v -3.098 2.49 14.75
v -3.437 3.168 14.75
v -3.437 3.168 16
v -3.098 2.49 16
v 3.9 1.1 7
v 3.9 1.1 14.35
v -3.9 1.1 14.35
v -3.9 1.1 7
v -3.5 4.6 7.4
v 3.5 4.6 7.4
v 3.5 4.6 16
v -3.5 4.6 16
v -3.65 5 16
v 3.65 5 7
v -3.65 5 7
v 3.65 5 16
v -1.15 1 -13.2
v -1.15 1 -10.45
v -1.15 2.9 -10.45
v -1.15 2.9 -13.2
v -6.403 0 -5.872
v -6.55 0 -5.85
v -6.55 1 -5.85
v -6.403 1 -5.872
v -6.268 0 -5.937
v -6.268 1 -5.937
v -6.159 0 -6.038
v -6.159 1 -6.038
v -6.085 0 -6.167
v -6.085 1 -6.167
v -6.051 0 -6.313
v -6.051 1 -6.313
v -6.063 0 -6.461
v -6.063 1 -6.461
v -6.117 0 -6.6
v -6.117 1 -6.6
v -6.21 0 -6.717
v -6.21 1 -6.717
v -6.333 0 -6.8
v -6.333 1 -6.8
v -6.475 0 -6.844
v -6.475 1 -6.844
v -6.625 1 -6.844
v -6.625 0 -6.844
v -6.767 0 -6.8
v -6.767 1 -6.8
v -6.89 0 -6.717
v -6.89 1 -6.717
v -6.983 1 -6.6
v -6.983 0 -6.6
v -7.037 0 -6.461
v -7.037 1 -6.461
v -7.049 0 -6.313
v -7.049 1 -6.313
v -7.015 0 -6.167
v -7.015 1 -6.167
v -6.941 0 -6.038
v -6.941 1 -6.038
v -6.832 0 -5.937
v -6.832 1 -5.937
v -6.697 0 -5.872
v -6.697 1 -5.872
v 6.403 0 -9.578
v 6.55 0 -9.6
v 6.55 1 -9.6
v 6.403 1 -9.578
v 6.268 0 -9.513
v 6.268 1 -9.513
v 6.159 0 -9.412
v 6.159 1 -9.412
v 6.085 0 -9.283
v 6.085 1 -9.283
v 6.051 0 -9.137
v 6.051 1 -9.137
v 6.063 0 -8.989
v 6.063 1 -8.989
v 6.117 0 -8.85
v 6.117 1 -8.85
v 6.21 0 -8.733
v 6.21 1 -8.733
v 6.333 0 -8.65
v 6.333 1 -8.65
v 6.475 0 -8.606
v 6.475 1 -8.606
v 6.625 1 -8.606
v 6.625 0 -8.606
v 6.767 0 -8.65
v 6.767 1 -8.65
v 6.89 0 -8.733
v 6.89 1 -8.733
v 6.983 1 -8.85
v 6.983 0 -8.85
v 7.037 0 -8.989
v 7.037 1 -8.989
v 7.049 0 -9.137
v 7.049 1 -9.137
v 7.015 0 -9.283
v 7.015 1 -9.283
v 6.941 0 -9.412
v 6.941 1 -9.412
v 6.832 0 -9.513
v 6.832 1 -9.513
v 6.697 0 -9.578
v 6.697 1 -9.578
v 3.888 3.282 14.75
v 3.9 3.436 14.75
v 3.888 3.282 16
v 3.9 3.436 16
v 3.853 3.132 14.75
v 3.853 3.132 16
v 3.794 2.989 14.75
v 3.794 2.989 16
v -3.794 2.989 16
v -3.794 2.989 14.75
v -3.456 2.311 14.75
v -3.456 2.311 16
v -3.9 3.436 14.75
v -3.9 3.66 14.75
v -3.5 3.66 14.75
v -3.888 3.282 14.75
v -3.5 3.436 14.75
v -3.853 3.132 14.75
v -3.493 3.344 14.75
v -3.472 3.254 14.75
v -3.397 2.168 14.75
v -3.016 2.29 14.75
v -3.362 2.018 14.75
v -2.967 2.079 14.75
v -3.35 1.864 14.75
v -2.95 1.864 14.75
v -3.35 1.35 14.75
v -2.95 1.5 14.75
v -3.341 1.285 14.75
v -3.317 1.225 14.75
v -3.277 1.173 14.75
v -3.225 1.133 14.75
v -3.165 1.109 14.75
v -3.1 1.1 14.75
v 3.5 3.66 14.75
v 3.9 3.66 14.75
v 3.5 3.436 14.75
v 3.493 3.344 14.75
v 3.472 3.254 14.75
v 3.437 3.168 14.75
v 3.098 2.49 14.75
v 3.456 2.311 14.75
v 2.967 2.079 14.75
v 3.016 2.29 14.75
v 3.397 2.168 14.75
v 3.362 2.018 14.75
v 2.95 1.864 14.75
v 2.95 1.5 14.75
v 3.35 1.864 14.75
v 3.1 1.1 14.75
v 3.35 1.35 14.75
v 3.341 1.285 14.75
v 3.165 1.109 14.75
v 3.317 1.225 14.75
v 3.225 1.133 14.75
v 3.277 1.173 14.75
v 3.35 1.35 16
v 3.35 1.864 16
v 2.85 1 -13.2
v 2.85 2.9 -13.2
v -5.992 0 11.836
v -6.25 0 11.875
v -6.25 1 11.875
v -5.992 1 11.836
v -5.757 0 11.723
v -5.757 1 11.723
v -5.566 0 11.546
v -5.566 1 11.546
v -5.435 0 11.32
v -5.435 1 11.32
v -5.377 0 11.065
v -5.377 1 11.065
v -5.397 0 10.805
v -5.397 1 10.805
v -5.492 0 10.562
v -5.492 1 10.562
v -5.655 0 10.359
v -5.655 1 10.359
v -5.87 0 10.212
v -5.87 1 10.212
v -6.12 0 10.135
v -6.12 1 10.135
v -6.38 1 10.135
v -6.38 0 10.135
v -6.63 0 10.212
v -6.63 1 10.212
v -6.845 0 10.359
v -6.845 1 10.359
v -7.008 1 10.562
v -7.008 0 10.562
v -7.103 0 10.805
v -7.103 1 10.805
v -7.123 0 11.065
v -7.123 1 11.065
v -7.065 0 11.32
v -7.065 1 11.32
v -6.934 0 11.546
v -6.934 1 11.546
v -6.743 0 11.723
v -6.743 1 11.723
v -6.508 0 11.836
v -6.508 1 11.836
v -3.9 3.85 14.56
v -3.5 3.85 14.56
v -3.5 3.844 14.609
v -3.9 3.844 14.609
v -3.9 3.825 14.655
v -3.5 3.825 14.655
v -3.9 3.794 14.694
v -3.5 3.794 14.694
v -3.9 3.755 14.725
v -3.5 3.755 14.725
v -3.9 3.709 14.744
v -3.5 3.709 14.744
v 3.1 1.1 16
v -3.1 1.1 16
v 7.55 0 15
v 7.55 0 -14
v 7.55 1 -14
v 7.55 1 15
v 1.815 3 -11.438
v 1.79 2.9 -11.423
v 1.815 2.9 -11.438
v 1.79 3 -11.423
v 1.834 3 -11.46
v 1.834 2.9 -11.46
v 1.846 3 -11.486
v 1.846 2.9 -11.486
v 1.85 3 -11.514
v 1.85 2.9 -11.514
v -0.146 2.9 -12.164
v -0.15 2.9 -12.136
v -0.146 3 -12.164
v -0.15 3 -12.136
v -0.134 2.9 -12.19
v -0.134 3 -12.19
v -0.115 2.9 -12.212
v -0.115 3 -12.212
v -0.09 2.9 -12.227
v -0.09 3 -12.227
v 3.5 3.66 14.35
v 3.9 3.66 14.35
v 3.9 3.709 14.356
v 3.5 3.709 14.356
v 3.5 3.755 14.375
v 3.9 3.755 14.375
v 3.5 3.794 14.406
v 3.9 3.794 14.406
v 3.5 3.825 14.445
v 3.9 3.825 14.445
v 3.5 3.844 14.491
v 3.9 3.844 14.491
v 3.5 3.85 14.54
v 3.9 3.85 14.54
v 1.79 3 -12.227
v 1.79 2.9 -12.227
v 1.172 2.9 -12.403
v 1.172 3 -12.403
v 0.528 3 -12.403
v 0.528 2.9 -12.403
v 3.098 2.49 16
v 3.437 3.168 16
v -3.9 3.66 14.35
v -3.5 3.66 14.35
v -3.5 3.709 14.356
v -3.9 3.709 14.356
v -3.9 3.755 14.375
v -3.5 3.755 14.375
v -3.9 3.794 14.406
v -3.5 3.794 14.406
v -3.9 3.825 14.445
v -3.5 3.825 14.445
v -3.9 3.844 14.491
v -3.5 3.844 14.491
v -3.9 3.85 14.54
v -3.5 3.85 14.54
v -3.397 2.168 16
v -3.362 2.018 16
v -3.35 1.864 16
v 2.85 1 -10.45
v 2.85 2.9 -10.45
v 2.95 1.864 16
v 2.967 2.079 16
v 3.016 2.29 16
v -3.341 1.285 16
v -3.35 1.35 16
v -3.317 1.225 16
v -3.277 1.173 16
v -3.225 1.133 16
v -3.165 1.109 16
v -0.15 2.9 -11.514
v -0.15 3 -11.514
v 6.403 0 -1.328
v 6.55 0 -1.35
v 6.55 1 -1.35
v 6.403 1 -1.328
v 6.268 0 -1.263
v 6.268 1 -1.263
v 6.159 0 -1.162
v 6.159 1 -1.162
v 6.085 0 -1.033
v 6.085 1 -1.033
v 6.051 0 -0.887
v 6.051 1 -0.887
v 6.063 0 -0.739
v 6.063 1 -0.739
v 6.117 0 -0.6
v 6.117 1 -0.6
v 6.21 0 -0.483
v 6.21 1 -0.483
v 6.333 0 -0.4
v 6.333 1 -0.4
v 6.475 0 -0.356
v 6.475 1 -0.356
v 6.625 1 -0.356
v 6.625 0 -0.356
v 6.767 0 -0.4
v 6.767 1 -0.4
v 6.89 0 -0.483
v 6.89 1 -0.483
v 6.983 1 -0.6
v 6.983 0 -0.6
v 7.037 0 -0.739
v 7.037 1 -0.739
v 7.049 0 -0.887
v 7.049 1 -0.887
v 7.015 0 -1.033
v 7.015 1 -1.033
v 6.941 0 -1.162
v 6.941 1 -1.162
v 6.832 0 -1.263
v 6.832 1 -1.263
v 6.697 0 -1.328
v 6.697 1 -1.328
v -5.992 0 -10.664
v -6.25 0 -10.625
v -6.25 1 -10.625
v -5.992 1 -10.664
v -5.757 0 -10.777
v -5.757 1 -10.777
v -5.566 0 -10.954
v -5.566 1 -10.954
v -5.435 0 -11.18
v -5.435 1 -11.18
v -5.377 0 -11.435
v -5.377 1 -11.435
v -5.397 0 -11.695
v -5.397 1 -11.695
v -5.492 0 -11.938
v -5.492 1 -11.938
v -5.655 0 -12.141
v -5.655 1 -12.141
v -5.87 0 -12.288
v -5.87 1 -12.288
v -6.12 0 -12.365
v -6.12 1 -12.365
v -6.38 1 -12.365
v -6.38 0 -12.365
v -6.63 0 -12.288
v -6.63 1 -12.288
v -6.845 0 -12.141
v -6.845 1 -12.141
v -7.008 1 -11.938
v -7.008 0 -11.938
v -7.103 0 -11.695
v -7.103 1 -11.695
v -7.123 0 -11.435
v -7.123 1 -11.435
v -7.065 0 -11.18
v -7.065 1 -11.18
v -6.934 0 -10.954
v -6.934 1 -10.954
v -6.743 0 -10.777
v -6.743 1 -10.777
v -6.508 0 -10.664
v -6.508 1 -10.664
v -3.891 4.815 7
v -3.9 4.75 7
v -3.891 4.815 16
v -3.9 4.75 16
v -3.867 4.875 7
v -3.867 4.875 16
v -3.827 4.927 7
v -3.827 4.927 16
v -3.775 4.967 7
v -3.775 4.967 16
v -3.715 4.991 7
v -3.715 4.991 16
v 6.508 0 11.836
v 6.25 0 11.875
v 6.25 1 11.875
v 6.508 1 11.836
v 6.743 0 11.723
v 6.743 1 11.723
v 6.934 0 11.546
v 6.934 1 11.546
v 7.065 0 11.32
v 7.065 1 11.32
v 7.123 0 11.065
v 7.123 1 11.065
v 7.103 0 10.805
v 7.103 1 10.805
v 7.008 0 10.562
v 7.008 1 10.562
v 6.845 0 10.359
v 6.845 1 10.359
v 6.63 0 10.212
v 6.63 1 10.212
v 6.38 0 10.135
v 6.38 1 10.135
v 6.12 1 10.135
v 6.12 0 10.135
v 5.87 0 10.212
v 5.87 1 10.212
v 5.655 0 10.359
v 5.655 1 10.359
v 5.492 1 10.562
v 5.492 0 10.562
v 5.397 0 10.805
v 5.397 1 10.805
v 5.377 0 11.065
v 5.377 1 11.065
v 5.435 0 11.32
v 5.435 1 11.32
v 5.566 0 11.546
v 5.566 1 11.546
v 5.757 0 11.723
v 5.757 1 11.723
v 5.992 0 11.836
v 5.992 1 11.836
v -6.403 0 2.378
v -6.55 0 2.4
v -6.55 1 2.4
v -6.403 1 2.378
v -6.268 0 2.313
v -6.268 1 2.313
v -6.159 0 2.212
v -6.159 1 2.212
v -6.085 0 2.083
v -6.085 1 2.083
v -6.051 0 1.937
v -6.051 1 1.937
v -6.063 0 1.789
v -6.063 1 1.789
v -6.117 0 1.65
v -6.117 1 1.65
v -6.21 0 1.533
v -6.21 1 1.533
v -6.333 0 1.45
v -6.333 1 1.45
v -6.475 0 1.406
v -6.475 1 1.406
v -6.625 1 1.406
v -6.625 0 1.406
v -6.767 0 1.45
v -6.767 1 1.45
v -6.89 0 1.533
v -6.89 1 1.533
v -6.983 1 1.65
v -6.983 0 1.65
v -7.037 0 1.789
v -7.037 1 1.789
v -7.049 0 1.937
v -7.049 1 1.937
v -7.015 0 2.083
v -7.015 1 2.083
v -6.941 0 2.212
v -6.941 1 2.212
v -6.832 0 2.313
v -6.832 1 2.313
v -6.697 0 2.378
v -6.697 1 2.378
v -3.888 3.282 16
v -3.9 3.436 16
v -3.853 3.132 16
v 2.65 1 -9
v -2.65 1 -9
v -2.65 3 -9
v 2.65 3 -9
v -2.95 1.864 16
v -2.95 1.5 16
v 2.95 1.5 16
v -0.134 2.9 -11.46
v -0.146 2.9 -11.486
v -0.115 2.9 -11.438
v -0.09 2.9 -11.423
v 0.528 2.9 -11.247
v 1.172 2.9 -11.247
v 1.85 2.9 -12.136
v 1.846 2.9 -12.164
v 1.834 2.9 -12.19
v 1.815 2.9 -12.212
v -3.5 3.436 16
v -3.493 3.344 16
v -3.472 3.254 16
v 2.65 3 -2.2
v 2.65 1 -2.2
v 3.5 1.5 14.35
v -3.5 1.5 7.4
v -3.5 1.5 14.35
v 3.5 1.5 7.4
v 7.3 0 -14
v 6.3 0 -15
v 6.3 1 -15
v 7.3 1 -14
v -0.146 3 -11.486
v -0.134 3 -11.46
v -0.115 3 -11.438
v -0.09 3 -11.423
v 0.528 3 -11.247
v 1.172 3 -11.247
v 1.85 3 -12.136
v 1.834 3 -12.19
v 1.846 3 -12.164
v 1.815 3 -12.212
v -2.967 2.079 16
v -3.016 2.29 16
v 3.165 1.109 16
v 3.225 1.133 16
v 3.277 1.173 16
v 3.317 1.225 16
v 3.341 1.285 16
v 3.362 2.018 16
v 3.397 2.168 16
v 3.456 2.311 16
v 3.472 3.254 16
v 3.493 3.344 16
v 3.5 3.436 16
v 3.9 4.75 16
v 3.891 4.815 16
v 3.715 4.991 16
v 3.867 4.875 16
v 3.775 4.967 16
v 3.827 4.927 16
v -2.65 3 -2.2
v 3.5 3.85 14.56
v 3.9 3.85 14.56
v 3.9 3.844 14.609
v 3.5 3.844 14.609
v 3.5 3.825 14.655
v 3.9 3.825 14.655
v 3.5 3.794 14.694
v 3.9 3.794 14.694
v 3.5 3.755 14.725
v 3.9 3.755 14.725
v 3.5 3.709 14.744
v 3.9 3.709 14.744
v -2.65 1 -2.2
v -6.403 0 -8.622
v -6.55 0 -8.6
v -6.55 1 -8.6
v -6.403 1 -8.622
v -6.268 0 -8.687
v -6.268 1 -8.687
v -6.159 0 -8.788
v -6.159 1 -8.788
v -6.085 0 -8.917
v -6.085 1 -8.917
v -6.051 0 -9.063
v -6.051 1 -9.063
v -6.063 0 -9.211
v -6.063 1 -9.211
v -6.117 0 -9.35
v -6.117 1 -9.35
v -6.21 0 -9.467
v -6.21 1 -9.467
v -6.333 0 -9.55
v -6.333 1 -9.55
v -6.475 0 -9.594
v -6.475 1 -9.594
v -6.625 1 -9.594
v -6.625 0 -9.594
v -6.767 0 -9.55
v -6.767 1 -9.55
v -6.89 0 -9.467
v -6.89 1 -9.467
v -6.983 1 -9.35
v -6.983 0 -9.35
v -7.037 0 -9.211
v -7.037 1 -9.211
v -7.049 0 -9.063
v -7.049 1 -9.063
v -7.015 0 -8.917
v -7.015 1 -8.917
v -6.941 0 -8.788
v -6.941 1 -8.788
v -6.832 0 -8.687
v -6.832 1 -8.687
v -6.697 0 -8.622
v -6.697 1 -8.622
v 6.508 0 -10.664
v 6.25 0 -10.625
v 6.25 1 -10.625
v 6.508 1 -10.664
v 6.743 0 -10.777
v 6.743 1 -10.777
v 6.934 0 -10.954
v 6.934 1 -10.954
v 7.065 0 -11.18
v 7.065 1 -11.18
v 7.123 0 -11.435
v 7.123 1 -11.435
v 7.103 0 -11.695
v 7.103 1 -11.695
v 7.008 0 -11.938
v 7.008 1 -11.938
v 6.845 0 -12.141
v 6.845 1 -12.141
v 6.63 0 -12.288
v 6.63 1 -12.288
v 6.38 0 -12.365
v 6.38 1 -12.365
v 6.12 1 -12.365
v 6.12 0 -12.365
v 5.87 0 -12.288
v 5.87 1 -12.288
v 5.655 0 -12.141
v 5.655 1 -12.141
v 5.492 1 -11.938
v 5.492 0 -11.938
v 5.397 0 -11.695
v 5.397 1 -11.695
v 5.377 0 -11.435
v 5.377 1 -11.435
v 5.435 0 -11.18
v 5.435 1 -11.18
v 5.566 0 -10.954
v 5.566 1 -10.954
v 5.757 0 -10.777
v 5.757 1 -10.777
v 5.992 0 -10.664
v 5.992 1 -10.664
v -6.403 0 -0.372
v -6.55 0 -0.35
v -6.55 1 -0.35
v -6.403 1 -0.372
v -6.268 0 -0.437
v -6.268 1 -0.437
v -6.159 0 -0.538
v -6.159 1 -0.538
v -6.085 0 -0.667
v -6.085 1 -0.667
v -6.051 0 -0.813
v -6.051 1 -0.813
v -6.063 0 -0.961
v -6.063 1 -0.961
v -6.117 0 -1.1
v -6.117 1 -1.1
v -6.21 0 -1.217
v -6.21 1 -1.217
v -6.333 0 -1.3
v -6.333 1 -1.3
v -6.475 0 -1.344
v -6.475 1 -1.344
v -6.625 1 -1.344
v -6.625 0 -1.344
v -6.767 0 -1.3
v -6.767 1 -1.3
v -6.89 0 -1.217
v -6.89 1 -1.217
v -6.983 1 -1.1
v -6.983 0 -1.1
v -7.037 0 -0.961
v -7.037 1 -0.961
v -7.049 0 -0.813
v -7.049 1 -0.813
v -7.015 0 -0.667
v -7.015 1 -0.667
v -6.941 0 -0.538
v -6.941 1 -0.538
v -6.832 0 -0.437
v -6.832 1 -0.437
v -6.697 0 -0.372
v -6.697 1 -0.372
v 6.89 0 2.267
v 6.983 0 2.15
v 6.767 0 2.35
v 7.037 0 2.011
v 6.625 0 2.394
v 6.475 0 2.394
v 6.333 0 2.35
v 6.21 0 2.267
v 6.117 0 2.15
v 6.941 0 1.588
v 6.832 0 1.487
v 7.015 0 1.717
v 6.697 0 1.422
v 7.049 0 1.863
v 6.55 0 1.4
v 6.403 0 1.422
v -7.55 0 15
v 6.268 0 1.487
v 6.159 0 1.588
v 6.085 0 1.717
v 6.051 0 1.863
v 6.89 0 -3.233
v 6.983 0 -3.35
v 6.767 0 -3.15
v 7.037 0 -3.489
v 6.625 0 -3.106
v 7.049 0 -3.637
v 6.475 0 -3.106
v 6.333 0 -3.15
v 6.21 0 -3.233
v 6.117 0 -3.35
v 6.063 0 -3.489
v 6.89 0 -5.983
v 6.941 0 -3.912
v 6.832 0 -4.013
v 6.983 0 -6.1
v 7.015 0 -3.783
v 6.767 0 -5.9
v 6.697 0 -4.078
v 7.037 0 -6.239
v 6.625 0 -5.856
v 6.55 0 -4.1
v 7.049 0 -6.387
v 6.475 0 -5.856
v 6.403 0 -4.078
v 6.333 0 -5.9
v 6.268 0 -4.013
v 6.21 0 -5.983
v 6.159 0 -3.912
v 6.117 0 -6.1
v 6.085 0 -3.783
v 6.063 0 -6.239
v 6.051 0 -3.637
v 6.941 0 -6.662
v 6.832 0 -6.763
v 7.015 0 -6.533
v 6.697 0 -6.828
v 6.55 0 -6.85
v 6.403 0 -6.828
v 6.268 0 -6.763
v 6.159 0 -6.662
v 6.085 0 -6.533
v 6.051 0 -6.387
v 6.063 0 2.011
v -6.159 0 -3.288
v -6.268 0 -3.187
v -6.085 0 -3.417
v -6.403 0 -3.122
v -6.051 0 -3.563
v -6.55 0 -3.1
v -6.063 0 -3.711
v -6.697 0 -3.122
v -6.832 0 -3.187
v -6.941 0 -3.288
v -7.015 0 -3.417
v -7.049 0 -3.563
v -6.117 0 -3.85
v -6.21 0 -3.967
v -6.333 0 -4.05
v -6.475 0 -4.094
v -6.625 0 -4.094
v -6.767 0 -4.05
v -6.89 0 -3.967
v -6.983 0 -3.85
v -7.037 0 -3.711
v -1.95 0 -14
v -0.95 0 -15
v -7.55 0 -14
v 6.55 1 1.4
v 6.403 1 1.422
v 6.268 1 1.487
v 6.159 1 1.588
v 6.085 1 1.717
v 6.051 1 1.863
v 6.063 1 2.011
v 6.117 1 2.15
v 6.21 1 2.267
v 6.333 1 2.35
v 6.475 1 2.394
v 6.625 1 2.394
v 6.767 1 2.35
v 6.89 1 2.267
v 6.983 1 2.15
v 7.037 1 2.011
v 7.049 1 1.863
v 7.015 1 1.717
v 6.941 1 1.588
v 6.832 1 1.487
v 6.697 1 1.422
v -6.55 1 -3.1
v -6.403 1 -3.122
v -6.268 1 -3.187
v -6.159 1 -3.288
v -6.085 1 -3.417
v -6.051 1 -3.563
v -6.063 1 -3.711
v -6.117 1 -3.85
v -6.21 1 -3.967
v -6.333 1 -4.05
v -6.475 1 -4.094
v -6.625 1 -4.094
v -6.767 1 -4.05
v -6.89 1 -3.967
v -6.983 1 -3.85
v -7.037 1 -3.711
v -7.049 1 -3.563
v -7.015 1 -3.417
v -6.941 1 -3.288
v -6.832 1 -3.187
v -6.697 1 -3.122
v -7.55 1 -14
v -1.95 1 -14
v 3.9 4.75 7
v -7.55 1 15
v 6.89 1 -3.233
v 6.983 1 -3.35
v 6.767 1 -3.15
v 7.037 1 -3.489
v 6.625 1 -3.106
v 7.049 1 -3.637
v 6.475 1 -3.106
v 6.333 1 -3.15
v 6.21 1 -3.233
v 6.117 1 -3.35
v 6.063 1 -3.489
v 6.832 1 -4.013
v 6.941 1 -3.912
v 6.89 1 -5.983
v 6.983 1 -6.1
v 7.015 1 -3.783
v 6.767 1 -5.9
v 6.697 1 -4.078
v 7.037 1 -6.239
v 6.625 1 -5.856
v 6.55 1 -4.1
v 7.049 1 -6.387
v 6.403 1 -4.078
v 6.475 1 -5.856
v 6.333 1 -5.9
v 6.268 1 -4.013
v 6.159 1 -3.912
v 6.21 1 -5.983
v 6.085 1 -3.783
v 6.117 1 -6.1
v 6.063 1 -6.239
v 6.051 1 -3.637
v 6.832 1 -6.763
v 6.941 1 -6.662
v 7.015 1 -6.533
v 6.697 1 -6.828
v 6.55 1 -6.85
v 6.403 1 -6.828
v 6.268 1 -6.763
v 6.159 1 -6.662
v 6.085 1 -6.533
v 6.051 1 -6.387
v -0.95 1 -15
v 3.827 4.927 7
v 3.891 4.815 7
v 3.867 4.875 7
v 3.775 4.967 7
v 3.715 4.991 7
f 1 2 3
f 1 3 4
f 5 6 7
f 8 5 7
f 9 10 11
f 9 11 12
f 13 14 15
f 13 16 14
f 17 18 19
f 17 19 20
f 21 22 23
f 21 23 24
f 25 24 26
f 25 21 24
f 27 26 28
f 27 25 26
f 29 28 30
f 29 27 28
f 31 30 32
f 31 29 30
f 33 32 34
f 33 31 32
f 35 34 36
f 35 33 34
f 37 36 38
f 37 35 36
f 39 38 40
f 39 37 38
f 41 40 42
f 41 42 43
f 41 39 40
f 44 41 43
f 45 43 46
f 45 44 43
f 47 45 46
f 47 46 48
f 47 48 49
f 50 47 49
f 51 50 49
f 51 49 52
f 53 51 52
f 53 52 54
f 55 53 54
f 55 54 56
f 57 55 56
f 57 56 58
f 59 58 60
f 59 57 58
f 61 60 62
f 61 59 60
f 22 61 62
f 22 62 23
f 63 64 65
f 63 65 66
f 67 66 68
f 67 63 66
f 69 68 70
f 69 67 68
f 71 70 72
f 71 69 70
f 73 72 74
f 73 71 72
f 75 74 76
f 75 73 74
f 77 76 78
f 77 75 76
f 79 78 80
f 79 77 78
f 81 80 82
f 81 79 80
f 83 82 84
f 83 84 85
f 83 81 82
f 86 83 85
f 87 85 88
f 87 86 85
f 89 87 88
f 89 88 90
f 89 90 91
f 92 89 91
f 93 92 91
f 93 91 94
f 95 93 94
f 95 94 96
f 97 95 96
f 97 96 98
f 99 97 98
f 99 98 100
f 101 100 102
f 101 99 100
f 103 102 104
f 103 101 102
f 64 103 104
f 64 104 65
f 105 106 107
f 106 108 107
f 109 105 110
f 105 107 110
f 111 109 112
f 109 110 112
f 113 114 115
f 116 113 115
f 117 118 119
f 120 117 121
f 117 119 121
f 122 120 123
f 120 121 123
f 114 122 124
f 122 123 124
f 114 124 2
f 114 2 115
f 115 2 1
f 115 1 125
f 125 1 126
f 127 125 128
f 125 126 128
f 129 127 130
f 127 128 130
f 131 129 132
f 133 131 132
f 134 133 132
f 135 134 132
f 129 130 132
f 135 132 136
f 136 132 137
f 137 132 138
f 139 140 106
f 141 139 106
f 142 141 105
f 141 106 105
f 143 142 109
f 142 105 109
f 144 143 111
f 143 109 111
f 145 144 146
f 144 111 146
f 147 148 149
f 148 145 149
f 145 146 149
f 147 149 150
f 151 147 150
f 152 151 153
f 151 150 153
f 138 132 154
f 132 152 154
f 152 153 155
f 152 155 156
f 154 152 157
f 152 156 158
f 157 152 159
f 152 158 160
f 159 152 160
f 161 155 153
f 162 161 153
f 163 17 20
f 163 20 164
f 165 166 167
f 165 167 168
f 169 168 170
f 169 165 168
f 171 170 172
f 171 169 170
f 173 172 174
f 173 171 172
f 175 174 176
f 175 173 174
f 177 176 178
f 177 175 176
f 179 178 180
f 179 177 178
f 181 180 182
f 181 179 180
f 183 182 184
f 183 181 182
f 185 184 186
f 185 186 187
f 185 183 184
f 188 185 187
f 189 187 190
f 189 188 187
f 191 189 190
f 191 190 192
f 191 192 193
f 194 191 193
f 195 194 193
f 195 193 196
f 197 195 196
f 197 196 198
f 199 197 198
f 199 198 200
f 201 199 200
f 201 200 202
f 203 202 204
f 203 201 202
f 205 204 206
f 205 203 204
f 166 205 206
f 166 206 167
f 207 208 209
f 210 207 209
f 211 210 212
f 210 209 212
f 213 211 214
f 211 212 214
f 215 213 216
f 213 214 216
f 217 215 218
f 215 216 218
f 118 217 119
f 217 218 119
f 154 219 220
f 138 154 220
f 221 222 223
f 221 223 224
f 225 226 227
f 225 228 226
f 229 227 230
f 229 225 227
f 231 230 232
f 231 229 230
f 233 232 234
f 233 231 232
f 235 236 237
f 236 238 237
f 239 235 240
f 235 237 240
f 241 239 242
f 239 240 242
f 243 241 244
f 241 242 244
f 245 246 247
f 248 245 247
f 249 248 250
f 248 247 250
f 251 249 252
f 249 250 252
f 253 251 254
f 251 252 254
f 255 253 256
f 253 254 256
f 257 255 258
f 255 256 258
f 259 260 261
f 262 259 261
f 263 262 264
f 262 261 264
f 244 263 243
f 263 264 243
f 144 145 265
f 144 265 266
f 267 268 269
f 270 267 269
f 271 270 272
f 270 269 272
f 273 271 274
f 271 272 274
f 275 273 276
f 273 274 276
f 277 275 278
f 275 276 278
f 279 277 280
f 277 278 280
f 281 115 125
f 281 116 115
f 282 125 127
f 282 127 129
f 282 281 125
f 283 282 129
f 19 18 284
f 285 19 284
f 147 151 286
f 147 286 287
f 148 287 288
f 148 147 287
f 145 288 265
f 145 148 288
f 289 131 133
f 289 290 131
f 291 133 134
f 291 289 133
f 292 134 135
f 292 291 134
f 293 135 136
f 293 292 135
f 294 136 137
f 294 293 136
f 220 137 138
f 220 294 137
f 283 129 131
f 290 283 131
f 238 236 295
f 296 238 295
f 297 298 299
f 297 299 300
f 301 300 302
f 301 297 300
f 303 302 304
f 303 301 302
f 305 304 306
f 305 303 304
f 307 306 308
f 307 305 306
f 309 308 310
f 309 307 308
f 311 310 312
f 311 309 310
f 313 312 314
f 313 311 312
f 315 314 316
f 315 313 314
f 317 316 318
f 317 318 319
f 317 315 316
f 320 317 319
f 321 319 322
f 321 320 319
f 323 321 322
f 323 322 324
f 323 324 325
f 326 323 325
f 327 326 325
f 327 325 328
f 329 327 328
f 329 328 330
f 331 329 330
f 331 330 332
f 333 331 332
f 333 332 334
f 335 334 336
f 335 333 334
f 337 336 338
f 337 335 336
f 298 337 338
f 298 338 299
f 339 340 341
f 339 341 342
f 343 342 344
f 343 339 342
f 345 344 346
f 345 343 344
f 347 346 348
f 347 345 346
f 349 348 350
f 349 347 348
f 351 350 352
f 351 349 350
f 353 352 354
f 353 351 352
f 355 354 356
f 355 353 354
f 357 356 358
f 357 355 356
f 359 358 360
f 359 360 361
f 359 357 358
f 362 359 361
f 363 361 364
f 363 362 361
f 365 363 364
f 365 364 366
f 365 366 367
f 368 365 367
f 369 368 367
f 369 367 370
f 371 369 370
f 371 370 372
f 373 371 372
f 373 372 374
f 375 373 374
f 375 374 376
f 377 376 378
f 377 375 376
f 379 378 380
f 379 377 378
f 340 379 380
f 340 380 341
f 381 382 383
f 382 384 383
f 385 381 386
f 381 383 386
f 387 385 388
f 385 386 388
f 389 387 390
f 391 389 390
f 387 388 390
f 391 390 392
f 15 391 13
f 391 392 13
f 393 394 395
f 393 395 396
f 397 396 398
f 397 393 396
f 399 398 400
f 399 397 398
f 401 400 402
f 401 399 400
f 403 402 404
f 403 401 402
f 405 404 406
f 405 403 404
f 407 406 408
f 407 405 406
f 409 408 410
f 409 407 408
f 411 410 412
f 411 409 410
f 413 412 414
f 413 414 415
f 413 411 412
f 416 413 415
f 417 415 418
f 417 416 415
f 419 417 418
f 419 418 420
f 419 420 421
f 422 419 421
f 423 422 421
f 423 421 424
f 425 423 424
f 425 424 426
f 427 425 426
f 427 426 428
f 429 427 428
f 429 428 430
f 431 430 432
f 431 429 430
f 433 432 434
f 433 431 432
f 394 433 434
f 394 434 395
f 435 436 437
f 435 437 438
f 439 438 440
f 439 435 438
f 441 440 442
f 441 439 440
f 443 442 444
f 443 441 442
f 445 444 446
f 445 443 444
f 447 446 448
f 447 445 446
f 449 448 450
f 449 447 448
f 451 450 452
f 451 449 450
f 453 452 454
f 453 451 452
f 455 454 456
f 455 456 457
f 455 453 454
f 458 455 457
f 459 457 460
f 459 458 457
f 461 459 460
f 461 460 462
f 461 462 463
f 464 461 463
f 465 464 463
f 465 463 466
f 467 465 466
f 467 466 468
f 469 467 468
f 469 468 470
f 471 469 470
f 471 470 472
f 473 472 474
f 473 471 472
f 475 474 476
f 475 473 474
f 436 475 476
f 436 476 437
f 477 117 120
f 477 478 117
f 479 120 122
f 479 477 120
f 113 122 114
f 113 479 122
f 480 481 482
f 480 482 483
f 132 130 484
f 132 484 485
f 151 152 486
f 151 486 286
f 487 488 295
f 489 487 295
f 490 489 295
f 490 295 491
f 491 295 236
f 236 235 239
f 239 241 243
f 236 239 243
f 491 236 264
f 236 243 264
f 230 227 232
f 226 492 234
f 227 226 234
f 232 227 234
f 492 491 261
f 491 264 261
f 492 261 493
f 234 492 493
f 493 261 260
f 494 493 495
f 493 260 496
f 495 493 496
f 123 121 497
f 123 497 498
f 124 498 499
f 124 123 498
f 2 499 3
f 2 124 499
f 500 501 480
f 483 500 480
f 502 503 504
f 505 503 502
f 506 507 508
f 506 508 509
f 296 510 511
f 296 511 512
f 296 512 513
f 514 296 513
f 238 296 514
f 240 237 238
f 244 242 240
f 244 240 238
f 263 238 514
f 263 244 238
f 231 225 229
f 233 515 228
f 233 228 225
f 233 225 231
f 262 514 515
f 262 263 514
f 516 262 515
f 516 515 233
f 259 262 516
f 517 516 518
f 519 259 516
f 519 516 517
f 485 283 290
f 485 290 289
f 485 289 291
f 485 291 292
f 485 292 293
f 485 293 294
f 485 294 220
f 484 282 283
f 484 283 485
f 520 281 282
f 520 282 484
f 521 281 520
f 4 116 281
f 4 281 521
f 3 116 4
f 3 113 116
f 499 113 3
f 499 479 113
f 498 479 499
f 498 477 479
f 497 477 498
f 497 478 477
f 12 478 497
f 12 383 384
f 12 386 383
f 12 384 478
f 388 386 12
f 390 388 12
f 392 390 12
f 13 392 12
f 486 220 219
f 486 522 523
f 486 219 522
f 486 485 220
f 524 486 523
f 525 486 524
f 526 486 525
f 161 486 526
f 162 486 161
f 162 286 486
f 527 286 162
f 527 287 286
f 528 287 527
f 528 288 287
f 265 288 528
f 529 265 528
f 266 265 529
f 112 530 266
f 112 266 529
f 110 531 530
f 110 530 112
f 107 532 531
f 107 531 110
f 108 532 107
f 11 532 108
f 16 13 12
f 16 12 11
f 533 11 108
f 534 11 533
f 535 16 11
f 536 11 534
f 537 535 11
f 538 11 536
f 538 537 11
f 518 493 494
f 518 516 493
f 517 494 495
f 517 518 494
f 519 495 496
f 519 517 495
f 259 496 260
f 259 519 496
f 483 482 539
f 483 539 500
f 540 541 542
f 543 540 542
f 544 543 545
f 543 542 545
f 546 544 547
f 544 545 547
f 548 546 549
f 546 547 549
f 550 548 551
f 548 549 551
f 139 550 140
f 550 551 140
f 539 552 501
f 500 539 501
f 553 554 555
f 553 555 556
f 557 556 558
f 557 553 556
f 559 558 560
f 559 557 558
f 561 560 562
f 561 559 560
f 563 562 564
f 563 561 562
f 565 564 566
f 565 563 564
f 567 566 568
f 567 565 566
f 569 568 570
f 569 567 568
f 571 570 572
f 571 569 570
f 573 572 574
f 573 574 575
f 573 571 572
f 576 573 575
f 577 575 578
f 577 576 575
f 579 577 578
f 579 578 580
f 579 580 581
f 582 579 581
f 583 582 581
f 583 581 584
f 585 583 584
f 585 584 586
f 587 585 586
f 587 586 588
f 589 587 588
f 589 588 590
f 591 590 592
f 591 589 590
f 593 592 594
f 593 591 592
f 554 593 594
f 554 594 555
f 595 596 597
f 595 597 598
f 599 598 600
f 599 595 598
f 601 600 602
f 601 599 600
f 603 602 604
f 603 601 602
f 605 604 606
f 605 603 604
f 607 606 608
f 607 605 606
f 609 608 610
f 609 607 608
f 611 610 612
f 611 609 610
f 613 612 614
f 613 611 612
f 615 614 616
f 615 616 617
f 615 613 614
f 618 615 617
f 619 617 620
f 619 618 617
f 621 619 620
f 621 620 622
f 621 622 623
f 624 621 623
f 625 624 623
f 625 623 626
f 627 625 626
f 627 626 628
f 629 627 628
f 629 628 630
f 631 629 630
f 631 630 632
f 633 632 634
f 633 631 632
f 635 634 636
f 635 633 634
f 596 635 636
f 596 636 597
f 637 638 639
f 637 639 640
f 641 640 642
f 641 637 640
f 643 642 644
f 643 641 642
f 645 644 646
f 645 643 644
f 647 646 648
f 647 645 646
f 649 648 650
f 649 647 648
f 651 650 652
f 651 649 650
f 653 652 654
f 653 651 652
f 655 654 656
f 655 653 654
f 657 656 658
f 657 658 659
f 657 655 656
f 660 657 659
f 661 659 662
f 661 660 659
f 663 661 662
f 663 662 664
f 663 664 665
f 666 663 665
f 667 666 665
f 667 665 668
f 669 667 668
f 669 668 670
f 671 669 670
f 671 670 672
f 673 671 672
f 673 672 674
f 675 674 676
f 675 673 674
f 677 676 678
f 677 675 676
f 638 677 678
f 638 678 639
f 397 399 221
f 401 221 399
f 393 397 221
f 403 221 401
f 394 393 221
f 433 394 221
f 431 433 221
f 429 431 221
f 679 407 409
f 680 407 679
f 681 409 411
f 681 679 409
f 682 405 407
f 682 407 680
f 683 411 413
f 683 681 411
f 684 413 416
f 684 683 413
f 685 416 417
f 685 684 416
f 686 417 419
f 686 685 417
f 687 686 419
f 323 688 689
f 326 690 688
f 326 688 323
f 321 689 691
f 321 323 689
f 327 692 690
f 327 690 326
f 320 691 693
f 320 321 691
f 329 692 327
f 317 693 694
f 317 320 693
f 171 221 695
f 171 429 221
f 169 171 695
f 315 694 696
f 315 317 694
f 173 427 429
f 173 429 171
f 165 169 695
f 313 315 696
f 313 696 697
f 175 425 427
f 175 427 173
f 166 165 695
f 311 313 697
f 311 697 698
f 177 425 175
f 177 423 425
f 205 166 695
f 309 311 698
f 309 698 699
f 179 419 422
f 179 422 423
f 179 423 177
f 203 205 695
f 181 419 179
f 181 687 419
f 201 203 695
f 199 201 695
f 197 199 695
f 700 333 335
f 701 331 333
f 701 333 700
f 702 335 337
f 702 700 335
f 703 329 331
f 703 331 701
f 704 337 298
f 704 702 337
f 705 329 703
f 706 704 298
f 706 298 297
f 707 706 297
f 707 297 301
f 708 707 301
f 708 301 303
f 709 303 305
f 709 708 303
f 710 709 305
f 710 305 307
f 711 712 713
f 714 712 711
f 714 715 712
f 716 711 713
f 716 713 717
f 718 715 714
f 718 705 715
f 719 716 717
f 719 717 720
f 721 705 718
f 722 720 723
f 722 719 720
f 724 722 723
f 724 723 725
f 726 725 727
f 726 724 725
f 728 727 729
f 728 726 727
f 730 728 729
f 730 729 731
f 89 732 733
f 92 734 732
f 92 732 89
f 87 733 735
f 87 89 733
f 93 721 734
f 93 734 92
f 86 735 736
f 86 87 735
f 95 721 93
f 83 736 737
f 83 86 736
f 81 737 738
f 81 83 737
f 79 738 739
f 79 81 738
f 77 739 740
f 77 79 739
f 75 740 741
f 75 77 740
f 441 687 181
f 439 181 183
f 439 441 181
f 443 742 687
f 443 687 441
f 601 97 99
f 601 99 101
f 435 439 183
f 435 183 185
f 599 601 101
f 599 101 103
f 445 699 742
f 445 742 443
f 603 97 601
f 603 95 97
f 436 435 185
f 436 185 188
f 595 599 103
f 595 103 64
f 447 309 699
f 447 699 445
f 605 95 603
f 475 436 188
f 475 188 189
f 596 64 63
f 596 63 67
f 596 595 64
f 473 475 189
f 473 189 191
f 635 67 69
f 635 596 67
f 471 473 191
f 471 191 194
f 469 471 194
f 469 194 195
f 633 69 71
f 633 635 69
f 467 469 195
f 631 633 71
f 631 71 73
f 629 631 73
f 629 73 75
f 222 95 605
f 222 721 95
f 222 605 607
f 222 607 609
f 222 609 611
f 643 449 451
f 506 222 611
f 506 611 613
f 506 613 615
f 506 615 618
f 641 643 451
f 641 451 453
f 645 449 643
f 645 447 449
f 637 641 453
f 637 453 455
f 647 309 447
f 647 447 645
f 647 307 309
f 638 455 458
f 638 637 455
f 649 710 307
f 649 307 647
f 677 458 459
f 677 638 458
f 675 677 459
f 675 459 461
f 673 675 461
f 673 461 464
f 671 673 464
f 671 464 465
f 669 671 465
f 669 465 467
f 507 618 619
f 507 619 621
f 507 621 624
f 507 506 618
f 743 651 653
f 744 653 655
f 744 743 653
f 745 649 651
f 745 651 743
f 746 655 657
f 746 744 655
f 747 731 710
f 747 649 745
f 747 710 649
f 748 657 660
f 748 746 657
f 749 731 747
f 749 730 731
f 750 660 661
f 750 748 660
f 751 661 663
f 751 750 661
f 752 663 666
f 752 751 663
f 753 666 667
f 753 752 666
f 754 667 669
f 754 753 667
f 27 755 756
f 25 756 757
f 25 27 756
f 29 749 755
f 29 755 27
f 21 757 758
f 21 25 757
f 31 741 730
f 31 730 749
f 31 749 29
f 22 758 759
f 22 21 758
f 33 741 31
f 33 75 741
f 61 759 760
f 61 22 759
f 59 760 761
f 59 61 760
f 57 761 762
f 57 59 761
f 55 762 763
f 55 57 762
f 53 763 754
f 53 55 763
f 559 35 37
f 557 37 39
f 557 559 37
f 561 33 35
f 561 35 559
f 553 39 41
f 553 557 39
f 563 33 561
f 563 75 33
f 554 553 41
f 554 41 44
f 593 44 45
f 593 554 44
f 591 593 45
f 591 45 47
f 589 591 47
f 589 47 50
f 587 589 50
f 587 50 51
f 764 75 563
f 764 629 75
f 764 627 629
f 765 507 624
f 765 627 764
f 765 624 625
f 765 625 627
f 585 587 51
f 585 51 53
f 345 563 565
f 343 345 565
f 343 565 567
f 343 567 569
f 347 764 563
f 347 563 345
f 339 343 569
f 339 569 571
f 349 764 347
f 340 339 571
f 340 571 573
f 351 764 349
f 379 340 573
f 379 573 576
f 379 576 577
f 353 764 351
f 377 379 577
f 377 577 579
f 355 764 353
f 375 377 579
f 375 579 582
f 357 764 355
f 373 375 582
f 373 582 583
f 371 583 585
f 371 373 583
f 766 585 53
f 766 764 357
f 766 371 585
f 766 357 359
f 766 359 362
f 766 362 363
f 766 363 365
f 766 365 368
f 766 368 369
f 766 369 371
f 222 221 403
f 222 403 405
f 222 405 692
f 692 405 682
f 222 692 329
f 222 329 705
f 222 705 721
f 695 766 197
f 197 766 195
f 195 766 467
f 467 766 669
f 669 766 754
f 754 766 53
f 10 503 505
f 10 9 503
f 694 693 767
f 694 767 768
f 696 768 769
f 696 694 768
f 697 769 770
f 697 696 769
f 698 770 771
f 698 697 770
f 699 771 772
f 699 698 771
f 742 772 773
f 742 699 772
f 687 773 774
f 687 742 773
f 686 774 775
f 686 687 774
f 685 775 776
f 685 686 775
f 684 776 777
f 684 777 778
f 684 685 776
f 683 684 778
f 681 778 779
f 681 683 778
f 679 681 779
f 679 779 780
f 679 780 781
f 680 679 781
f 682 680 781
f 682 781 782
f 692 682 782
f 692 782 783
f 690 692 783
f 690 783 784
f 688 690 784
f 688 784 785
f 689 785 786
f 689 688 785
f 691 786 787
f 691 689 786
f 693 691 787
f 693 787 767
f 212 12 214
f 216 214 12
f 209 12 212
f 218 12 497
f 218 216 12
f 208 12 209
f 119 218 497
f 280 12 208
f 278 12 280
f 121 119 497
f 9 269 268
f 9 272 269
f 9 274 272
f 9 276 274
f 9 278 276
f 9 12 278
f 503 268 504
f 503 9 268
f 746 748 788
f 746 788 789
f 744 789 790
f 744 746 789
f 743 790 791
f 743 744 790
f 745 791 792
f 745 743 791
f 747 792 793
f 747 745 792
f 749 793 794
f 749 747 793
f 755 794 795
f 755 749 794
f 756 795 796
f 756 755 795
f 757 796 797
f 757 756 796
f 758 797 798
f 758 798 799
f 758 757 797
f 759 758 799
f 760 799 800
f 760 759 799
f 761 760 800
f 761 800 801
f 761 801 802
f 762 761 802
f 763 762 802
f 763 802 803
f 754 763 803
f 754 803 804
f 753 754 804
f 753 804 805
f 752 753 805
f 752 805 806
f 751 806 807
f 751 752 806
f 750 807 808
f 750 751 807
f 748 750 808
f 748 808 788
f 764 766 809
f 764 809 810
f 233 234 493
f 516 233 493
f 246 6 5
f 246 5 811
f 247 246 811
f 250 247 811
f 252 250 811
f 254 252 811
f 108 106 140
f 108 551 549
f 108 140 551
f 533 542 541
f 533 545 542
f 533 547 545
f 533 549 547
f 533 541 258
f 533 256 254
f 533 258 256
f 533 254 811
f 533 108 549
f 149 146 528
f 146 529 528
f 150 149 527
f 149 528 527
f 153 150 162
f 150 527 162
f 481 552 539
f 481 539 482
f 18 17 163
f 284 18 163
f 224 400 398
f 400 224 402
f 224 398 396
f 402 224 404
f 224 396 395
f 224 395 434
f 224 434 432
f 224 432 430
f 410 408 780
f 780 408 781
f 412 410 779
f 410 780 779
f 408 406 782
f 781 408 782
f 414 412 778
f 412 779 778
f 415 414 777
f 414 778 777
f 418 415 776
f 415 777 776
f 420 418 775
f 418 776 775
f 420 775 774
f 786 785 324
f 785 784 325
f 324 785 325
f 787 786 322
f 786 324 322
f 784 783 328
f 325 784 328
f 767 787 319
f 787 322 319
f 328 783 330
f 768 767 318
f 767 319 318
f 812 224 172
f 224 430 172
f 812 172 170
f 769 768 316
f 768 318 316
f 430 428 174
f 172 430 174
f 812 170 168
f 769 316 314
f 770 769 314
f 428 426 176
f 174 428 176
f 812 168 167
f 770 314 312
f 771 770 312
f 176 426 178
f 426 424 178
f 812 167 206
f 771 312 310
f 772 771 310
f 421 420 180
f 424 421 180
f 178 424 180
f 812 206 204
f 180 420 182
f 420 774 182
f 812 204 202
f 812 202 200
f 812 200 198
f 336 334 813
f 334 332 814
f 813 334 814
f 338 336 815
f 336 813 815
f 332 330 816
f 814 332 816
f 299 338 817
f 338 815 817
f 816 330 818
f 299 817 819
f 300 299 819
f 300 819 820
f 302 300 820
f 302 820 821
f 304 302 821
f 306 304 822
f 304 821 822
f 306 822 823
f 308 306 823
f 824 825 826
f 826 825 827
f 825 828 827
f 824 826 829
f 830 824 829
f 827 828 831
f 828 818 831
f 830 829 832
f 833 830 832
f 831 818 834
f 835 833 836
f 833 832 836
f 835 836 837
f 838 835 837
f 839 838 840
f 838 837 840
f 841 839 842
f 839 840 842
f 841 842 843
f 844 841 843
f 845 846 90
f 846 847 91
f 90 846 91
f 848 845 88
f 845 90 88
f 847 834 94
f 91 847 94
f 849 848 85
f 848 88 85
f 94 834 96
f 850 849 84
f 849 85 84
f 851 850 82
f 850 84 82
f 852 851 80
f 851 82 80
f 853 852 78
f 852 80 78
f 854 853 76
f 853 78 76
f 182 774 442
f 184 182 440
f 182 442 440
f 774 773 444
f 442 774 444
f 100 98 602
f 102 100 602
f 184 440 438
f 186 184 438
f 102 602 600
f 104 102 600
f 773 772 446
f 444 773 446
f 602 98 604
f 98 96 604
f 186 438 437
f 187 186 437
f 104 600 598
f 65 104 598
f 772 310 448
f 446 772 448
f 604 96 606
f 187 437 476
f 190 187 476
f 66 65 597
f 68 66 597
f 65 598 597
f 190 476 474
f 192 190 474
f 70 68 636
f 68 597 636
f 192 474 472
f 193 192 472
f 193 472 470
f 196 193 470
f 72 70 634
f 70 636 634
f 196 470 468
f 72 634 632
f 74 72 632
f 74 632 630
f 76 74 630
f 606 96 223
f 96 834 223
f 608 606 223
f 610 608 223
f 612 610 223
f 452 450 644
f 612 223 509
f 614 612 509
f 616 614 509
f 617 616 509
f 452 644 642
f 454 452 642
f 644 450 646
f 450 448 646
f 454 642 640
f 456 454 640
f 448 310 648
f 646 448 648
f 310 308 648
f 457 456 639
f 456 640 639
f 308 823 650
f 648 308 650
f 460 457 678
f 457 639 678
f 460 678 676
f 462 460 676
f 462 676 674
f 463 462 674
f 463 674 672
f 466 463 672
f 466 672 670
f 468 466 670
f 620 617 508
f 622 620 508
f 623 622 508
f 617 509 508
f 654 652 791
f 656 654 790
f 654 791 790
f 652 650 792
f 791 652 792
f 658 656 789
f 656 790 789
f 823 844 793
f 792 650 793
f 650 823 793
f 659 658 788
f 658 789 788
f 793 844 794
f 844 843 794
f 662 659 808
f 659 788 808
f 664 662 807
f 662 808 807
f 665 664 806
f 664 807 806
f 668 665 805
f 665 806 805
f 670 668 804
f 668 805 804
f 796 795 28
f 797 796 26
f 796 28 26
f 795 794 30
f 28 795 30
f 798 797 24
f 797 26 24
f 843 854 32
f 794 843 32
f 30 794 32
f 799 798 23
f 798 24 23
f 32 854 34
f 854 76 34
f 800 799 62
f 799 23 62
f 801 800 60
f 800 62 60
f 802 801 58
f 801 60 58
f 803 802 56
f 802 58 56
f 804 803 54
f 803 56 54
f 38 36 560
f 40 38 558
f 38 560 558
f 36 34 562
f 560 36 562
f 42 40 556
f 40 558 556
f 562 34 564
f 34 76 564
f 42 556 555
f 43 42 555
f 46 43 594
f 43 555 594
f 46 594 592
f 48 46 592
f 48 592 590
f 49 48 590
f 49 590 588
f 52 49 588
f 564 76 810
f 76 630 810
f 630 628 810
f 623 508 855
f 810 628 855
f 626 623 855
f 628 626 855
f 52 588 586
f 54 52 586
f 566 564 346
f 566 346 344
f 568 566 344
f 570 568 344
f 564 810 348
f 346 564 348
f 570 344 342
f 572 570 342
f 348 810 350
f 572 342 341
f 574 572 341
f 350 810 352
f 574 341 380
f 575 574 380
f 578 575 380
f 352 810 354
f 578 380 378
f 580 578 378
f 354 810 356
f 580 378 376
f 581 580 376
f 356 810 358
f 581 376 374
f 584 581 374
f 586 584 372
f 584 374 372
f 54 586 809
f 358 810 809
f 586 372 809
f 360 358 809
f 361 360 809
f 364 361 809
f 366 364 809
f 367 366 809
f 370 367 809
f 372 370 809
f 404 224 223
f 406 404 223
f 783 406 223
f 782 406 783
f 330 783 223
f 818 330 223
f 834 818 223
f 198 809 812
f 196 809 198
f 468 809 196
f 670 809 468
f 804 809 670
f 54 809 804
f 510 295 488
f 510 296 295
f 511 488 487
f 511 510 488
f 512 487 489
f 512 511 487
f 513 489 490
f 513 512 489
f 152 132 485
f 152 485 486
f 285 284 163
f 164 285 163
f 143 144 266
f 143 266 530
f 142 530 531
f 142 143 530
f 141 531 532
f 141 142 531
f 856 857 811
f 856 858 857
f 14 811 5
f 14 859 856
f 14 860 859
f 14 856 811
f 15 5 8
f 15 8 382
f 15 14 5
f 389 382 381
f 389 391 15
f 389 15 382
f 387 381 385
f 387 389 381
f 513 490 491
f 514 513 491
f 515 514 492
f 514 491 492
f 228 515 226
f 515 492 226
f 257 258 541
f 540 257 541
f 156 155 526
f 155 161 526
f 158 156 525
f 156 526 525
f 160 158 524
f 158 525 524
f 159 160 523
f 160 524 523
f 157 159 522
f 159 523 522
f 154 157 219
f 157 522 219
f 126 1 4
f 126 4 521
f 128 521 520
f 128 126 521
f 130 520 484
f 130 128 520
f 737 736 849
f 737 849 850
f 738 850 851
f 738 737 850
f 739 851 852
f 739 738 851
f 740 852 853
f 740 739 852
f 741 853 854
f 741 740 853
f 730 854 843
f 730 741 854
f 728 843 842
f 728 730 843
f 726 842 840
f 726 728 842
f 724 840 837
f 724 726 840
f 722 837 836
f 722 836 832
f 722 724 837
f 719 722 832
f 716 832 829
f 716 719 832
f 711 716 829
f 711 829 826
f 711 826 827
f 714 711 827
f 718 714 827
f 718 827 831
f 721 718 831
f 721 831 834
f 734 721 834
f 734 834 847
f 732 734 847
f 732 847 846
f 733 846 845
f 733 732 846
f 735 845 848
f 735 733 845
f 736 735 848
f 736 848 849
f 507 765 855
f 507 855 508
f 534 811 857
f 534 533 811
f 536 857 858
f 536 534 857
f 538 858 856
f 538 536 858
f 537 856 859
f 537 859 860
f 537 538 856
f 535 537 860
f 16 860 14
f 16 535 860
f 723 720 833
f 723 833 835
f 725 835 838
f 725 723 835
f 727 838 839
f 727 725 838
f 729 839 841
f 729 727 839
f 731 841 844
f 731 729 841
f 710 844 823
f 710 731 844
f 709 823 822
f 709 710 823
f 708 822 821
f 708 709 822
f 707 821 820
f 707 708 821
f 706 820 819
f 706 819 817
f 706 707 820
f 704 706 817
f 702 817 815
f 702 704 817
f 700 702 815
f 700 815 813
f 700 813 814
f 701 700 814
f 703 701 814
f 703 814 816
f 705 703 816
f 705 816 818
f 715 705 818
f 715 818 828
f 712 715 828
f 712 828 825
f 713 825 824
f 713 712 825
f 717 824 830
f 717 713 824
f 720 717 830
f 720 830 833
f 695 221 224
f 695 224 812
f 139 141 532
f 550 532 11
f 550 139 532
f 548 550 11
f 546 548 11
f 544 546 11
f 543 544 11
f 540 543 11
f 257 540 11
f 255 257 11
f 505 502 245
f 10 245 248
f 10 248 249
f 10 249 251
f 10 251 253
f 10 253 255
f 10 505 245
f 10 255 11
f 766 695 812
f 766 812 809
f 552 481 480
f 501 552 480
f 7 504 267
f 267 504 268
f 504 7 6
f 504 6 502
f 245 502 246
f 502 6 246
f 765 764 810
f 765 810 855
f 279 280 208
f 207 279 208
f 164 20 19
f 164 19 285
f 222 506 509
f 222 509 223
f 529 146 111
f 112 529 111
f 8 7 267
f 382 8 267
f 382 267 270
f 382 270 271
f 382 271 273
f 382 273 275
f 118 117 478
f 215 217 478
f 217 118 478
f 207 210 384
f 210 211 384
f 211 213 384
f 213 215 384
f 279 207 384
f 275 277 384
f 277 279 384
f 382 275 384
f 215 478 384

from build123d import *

# Parameters (mm, degrees)
SKETCH1_R                = 0.875
SKETCH1_R_2              = 0.5
BOSS_EXTRUDE1_DEPTH      = 1
BOSS_EXTRUDE2_DEPTH      = 1
BOSS_EXTRUDE2_DEPTH_BACK = 0.25
SKETCH3_W                = 7.8
SKETCH3_H                = 3.9
BOSS_EXTRUDE3_DEPTH      = 7.75
FILLET1_R                = 0.25
FILLET2_R                = 1
SHELL1_START             = 7.4
SHELL1_DEPTH             = 8.6
SHELL1_2_DEPTH           = 6.95
CUT_EXTRUDE1_DEPTH       = 8.75
SKETCH6_W                = 5.3
SKETCH6_H                = 6.8
BOSS_EXTRUDE4_DEPTH      = 2
SKETCH7_W                = 4
SKETCH7_H                = 2.75
BOSS_EXTRUDE5_DEPTH      = 1.9
BOSS_EXTRUDE6_DEPTH      = 0.1
FILLET3_R                = 0.1


# Read off the part's stored shape, not the designer's step: Shell1
with BuildPart() as part:
    # Sketch1 → Boss-Extrude1 (new body)
    with BuildSketch(Plane(origin=(0, 0, 0), x_dir=(1, 0, 0), z_dir=(0, 1, 0))):
        Polygon((-7.55, 14), (-1.95, 14), (-0.95, 15), (6.3, 15), (7.3, 14), (7.55, 14), (7.55, -15), (-7.55, -15), align=None)
        with Locations(Location((-6.25, 11.5, 0), (0, 0, 270))):
            Circle(SKETCH1_R, mode=Mode.SUBTRACT)
        with Locations(Location((6.25, 11.5, 0), (0, 0, 270))):
            Circle(SKETCH1_R, mode=Mode.SUBTRACT)
        with Locations(Location((-6.25, -11, 0), (0, 0, 270))):
            Circle(SKETCH1_R, mode=Mode.SUBTRACT)
        with Locations(Location((6.25, -11, 0), (0, 0, 270))):
            Circle(SKETCH1_R, mode=Mode.SUBTRACT)
        with Locations(Location((-6.55, 9.1, 0), (0, 0, 270))):
            Circle(SKETCH1_R_2, mode=Mode.SUBTRACT)
        with Locations(Location((-6.55, -1.9, 0), (0, 0, 270))):
            Circle(SKETCH1_R_2, mode=Mode.SUBTRACT)
        with Locations(Location((-6.55, 3.6, 0), (0, 0, 270))):
            Circle(SKETCH1_R_2, mode=Mode.SUBTRACT)
        with Locations(Location((-6.55, 6.35, 0), (0, 0, 270))):
            Circle(SKETCH1_R_2, mode=Mode.SUBTRACT)
        with Locations(Location((-6.55, 0.85, 0), (0, 0, 270))):
            Circle(SKETCH1_R_2, mode=Mode.SUBTRACT)
        with Locations(Location((6.55, -1.9, 0), (0, 0, 90))):
            Circle(SKETCH1_R_2, mode=Mode.SUBTRACT)
        with Locations(Location((6.55, 0.85, 0), (0, 0, 90))):
            Circle(SKETCH1_R_2, mode=Mode.SUBTRACT)
        with Locations(Location((6.55, 3.6, 0), (0, 0, 90))):
            Circle(SKETCH1_R_2, mode=Mode.SUBTRACT)
        with Locations(Location((6.55, 6.35, 0), (0, 0, 90))):
            Circle(SKETCH1_R_2, mode=Mode.SUBTRACT)
        with Locations(Location((6.55, 9.1, 0), (0, 0, 90))):
            Circle(SKETCH1_R_2, mode=Mode.SUBTRACT)
    extrude(amount=BOSS_EXTRUDE1_DEPTH)


with BuildPart() as body_2:
    # Sketch2 → Boss-Extrude2 (new, two sides: drawn at the far end of the back side and taken through both)
    with BuildSketch(Plane.XY.offset(15).offset(-BOSS_EXTRUDE2_DEPTH_BACK)):
        Polygon((3.35, 1.1), (3.35, 2.1), (3.9, 3.2), (3.9, 5), (-3.9, 5), (-3.9, 3.2), (-3.35, 2.1), (-3.35, 1.1), align=None)
    extrude(amount=BOSS_EXTRUDE2_DEPTH + BOSS_EXTRUDE2_DEPTH_BACK)

    # Sketch3 → Boss-Extrude3 (add)
    with BuildSketch(Plane(origin=(0, 0, 14.75), x_dir=(-1, 0, 0), z_dir=(0, 0, -1))):
        with Locations((0, 3.05)):
            Rectangle(SKETCH3_W, SKETCH3_H)
    extrude(amount=BOSS_EXTRUDE3_DEPTH)

    # Fillet1
    fillet1_edges = [body_2.edges().sort_by_distance(p)[0] for p in [
        (3.35, 1.1, 15.375),
        (-3.35, 1.1, 15.375),
        (3.9, 5, 11.5),
        (-3.9, 5, 11.5),
    ]]
    fillet(fillet1_edges, radius=FILLET1_R)

    # Fillet2
    fillet2_edges = [body_2.edges().sort_by_distance(p)[0] for p in [
        (3.9, 3.2, 15.375),
        (3.35, 2.1, 15.375),
        (-3.35, 2.1, 15.375),
        (-3.9, 3.2, 15.375),
    ]]
    fillet(fillet2_edges, radius=FILLET2_R)

    # Shell1 outline → Shell1 (cut)
    with BuildSketch(Plane.XY.offset(SHELL1_START)):
        with BuildLine():
            Line((-2.95, 1.863932023), (-2.95, 1.5))
            Line((-2.95, 1.5), (2.95, 1.5))
            Line((2.95, 1.5), (2.95, 1.863932023))
            ThreePointArc((2.95, 1.863932023), (2.987451415, 2.185586111), (3.097801933, 2.490031056))
            Line((3.097801933, 2.490031056), (3.436656315, 3.16773982))
            ThreePointArc((3.436656315, 3.16773982), (3.483949394, 3.298216225), (3.5, 3.436067977))
            Line((3.5, 3.436067977), (3.5, 4.6))
            Line((3.5, 4.6), (-3.5, 4.6))
            Line((-3.5, 4.6), (-3.5, 3.436067977))
            ThreePointArc((-3.5, 3.436067977), (-3.483949394, 3.298216225), (-3.436656315, 3.16773982))
            Line((-3.436656315, 3.16773982), (-3.097801933, 2.490031056))
            ThreePointArc((-3.097801933, 2.490031056), (-2.987451415, 2.185586111), (-2.95, 1.863932023))
        make_face()
    extrude(amount=SHELL1_DEPTH, mode=Mode.SUBTRACT)

    # Shell1 2 outline → Shell1 2 (cut)
    with BuildSketch(Plane.XY.offset(SHELL1_START)):
        with BuildLine():
            Line((-3.5, 3.436067977), (-3.5, 1.5))
            Line((-3.5, 1.5), (-2.95, 1.5))
            Line((-2.95, 1.5), (-2.95, 1.863932023))
            ThreePointArc((-2.95, 1.863932023), (-2.987451415, 2.185586111), (-3.097801933, 2.490031056))
            Line((-3.097801933, 2.490031056), (-3.436656315, 3.16773982))
            ThreePointArc((-3.436656315, 3.16773982), (-3.483949394, 3.298216225), (-3.5, 3.436067977))
        make_face()
        with BuildLine():
            Line((2.95, 1.863932023), (2.95, 1.5))
            Line((2.95, 1.5), (3.5, 1.5))
            Line((3.5, 1.5), (3.5, 3.436067977))
            ThreePointArc((3.5, 3.436067977), (3.483949394, 3.298216225), (3.436656315, 3.16773982))
            Line((3.436656315, 3.16773982), (3.097801933, 2.490031056))
            ThreePointArc((3.097801933, 2.490031056), (2.987451415, 2.185586111), (2.95, 1.863932023))
        make_face()
    extrude(amount=SHELL1_2_DEPTH, mode=Mode.SUBTRACT)

    # Sketch5 → Cut-Extrude1 (cut)
    with BuildSketch(Plane(origin=(3.9, 0, 0), x_dir=(0, 0, -1), z_dir=(1, 0, 0))):
        with BuildLine():
            Line((-14.75, 1.1), (-14.35, 1.1))
            Line((-14.35, 1.1), (-14.35, 3.66))
            ThreePointArc((-14.35, 3.66), (-14.405649712, 3.794350288), (-14.54, 3.85))
            Line((-14.54, 3.85), (-14.56, 3.85))
            ThreePointArc((-14.56, 3.85), (-14.694350288, 3.794350288), (-14.75, 3.66))
            Line((-14.75, 3.66), (-14.75, 1.1))
        make_face()
    extrude(amount=-CUT_EXTRUDE1_DEPTH, mode=Mode.SUBTRACT)


with BuildPart() as body_3:
    # Sketch6 → Boss-Extrude4 (new body)
    with BuildSketch(Plane(origin=(0, 1, 0), x_dir=(1, 0, 0), z_dir=(0, 1, 0))):
        with Locations((0, 5.6)):
            Rectangle(SKETCH6_W, SKETCH6_H)
    extrude(amount=BOSS_EXTRUDE4_DEPTH)


with BuildPart() as body_4:
    # Sketch7 → Boss-Extrude5 (new body)
    with BuildSketch(Plane(origin=(0, 1, 0), x_dir=(1, 0, 0), z_dir=(0, 1, 0))):
        with Locations((0.85, 11.825)):
            Rectangle(SKETCH7_W, SKETCH7_H)
    extrude(amount=BOSS_EXTRUDE5_DEPTH)


with BuildPart() as body_5:
    # Sketch8 → Boss-Extrude6 (new body)
    with BuildSketch(Plane(origin=(0, 2.9, 0), x_dir=(1, 0, 0), z_dir=(0, 1, 0))):
        with BuildLine():
            Line((-0.15, 12.2), (-0.15, 11.45))
            ThreePointArc((-0.15, 11.45), (0.85, 11.225), (1.85, 11.45))
            Line((1.85, 11.45), (1.85, 12.2))
            ThreePointArc((1.85, 12.2), (0.85, 12.425), (-0.15, 12.2))
        make_face()
    extrude(amount=BOSS_EXTRUDE6_DEPTH)

    # Fillet3
    fillet3_edges = [body_5.edges().sort_by_distance(p)[0] for p in [
        (1.85, 2.95, -12.2),
        (1.85, 2.95, -11.45),
        (-0.15, 2.95, -11.45),
        (-0.15, 2.95, -12.2),
    ]]
    fillet(fillet3_edges, radius=FILLET3_R)


solid = Compound([part.part, body_2.part, body_3.part, body_4.part, body_5.part])
